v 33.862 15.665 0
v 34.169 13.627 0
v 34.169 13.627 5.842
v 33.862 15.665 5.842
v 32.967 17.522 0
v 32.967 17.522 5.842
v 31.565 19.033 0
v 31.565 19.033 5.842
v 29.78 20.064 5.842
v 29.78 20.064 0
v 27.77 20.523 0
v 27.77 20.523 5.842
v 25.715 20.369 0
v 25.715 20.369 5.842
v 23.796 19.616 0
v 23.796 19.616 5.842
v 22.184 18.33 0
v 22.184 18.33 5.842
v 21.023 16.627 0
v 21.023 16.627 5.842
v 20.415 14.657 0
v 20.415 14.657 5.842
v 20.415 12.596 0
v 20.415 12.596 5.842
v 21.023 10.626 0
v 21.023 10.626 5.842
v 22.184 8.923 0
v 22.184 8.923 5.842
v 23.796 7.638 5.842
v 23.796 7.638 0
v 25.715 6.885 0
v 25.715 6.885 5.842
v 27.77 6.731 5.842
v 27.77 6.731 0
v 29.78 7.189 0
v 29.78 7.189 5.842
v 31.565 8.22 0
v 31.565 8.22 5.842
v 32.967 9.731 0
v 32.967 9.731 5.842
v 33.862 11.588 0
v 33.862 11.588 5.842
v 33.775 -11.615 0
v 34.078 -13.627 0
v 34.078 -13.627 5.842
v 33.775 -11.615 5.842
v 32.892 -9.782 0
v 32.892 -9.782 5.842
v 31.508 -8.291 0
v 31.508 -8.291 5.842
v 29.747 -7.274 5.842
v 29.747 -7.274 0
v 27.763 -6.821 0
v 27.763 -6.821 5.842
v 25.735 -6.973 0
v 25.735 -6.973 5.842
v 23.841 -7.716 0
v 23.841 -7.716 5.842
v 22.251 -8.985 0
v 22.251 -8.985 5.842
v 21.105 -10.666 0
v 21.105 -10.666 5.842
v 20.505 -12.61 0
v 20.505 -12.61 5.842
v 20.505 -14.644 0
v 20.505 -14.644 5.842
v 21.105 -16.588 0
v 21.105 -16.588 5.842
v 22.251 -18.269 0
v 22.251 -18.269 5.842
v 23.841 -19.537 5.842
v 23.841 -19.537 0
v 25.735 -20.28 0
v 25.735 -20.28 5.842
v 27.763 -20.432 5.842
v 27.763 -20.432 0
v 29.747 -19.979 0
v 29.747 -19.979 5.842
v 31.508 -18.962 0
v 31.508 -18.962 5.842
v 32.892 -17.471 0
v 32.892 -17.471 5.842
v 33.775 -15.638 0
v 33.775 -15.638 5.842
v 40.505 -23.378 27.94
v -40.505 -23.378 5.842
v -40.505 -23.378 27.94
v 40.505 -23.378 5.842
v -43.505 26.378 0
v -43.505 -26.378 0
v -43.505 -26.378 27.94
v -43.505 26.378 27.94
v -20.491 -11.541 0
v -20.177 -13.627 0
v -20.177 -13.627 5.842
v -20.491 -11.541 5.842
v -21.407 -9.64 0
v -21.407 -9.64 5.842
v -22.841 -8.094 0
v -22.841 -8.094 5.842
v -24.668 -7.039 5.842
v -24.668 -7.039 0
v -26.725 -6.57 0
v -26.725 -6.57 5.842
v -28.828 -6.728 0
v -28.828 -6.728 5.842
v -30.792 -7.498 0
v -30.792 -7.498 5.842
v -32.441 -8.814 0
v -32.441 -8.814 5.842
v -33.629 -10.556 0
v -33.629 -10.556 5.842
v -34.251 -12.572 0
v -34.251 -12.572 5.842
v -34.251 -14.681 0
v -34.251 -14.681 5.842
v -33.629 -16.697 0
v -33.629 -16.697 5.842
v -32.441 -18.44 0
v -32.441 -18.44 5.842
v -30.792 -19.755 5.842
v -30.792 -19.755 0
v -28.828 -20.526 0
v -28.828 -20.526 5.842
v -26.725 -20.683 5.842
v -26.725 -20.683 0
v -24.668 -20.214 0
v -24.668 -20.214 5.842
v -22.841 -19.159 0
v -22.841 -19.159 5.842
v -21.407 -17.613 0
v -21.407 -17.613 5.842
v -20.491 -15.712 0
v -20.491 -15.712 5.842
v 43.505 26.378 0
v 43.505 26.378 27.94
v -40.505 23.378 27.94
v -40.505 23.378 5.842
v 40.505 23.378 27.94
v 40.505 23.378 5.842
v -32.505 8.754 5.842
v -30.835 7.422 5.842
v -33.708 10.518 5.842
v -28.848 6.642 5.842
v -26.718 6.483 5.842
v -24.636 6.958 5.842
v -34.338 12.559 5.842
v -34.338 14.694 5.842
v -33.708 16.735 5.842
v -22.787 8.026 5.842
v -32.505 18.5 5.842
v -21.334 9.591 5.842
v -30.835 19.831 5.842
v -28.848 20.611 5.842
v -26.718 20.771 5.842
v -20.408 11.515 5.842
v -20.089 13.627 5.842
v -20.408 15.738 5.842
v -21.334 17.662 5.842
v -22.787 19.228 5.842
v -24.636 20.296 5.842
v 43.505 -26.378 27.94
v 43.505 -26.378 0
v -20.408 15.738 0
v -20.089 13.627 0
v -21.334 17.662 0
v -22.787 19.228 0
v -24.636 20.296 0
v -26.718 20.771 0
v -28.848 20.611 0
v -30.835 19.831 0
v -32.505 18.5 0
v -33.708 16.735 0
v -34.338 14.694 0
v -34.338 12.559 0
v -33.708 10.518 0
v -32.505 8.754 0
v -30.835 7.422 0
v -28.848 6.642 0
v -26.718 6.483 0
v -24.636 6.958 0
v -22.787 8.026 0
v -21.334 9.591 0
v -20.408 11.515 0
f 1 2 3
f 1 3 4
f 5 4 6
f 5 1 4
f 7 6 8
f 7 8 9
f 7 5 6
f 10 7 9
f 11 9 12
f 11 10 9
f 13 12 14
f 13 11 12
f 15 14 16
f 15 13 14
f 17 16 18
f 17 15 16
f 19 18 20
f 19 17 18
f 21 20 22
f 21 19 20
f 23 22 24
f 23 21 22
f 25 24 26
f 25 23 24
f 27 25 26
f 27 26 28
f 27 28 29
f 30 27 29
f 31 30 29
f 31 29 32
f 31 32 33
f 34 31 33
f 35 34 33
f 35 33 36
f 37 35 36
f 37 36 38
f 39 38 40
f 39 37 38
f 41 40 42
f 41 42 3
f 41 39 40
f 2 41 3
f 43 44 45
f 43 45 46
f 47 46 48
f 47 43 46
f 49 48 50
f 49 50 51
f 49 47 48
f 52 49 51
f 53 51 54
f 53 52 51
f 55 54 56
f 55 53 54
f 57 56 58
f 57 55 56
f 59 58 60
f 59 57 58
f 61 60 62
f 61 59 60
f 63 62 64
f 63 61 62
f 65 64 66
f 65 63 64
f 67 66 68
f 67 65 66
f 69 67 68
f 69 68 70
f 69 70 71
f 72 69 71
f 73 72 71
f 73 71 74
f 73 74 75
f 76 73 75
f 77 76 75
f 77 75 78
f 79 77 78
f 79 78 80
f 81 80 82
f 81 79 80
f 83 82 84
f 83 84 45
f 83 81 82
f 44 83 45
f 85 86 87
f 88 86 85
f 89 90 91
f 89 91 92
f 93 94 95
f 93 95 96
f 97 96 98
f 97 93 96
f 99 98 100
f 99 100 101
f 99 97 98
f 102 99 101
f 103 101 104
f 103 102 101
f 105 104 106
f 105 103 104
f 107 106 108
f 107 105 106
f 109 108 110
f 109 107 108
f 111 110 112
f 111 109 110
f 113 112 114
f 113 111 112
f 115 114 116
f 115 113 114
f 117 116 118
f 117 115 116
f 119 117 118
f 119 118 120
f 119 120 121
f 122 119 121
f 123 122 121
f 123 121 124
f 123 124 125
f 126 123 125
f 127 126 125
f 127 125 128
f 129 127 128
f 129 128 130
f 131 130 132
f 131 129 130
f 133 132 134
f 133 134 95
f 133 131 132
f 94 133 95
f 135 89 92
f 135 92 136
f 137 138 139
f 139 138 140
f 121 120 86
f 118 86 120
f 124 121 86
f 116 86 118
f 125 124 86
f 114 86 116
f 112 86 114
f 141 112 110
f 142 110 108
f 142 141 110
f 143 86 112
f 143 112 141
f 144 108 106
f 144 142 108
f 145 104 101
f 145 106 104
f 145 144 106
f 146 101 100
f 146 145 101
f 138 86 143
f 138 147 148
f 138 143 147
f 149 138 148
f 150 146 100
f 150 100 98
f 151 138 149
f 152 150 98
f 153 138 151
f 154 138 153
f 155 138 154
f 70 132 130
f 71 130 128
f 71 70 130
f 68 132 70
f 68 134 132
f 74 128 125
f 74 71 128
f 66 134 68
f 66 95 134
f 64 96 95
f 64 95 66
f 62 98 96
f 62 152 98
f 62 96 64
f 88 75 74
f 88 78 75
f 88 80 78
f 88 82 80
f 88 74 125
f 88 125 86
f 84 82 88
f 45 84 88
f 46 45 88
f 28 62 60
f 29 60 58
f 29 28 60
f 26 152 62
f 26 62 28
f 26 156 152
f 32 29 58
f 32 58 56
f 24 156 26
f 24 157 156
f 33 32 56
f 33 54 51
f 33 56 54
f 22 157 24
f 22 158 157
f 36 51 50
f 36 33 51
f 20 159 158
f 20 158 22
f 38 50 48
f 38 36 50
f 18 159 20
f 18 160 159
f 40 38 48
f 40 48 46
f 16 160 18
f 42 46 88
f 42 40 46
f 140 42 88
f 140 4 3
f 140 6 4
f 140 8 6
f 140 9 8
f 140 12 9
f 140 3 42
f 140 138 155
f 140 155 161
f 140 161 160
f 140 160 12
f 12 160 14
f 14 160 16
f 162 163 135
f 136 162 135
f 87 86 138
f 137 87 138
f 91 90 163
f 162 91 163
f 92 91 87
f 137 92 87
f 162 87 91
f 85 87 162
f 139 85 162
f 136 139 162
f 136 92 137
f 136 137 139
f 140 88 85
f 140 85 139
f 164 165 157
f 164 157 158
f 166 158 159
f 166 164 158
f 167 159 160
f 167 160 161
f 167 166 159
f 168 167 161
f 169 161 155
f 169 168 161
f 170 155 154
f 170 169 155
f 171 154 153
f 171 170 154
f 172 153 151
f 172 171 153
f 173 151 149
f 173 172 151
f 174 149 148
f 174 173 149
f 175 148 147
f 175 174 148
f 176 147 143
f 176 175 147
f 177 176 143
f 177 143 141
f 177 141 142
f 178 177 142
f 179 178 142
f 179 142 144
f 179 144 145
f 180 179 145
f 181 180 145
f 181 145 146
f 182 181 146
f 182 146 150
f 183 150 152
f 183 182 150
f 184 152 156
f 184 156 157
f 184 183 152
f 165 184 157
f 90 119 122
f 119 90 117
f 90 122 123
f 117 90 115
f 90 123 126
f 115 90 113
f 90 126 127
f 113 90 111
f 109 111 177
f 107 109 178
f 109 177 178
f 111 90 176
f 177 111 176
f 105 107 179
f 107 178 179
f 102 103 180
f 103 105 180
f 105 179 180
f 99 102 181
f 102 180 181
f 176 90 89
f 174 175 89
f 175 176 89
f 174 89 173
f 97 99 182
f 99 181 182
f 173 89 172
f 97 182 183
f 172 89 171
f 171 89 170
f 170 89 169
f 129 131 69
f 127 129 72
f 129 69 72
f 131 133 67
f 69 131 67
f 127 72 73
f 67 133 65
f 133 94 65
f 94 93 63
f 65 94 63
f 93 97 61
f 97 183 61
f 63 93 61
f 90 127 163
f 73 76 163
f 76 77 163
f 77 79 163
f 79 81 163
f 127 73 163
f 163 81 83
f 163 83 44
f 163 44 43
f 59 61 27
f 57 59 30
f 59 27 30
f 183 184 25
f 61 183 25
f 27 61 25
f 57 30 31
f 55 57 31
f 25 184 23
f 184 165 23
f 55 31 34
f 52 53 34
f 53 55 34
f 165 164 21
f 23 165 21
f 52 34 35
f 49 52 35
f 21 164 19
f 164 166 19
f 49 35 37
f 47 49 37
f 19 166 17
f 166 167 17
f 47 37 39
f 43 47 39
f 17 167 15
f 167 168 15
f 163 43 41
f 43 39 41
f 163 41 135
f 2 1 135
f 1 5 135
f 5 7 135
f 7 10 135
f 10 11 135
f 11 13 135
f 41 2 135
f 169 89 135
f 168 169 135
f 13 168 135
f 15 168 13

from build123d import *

# Parameters (mm, degrees)
F0_W     = 87.010126
F0_H     = 52.755846
F0_W_2   = 81.010126
F0_H_2   = 46.755846
F1_DEPTH = 27.94
F0_R     = 7.07637
F0_R_2   = 6.824526
F0_R_3   = 7.16417
F0_R_4   = 6.915523
F2_DEPTH = 5.842


with BuildPart() as f1:
    # F0 (on Top) → F1 (new body)
    with BuildSketch(Plane.XY):
        Rectangle(F0_W, F0_H)
        Rectangle(F0_W_2, F0_H_2, mode=Mode.SUBTRACT)
    extrude(amount=F1_DEPTH)

    # F0 (on Top) → F2 (join)
    with BuildSketch(Plane.XY):
        Rectangle(F0_W, F0_H)
        Rectangle(F0_W_2, F0_H_2, mode=Mode.SUBTRACT)
        Rectangle(F0_W_2, F0_H_2)
        with Locations((-27.253406, -13.626703)):
            Circle(F0_R, mode=Mode.SUBTRACT)
        with Locations((27.253406, -13.626703)):
            Circle(F0_R_2, mode=Mode.SUBTRACT)
        with Locations((-27.253406, 13.626703)):
            Circle(F0_R_3, mode=Mode.SUBTRACT)
        with Locations((27.253406, 13.626703)):
            Circle(F0_R_4, mode=Mode.SUBTRACT)
    extrude(amount=F2_DEPTH)


solid = f1.part
